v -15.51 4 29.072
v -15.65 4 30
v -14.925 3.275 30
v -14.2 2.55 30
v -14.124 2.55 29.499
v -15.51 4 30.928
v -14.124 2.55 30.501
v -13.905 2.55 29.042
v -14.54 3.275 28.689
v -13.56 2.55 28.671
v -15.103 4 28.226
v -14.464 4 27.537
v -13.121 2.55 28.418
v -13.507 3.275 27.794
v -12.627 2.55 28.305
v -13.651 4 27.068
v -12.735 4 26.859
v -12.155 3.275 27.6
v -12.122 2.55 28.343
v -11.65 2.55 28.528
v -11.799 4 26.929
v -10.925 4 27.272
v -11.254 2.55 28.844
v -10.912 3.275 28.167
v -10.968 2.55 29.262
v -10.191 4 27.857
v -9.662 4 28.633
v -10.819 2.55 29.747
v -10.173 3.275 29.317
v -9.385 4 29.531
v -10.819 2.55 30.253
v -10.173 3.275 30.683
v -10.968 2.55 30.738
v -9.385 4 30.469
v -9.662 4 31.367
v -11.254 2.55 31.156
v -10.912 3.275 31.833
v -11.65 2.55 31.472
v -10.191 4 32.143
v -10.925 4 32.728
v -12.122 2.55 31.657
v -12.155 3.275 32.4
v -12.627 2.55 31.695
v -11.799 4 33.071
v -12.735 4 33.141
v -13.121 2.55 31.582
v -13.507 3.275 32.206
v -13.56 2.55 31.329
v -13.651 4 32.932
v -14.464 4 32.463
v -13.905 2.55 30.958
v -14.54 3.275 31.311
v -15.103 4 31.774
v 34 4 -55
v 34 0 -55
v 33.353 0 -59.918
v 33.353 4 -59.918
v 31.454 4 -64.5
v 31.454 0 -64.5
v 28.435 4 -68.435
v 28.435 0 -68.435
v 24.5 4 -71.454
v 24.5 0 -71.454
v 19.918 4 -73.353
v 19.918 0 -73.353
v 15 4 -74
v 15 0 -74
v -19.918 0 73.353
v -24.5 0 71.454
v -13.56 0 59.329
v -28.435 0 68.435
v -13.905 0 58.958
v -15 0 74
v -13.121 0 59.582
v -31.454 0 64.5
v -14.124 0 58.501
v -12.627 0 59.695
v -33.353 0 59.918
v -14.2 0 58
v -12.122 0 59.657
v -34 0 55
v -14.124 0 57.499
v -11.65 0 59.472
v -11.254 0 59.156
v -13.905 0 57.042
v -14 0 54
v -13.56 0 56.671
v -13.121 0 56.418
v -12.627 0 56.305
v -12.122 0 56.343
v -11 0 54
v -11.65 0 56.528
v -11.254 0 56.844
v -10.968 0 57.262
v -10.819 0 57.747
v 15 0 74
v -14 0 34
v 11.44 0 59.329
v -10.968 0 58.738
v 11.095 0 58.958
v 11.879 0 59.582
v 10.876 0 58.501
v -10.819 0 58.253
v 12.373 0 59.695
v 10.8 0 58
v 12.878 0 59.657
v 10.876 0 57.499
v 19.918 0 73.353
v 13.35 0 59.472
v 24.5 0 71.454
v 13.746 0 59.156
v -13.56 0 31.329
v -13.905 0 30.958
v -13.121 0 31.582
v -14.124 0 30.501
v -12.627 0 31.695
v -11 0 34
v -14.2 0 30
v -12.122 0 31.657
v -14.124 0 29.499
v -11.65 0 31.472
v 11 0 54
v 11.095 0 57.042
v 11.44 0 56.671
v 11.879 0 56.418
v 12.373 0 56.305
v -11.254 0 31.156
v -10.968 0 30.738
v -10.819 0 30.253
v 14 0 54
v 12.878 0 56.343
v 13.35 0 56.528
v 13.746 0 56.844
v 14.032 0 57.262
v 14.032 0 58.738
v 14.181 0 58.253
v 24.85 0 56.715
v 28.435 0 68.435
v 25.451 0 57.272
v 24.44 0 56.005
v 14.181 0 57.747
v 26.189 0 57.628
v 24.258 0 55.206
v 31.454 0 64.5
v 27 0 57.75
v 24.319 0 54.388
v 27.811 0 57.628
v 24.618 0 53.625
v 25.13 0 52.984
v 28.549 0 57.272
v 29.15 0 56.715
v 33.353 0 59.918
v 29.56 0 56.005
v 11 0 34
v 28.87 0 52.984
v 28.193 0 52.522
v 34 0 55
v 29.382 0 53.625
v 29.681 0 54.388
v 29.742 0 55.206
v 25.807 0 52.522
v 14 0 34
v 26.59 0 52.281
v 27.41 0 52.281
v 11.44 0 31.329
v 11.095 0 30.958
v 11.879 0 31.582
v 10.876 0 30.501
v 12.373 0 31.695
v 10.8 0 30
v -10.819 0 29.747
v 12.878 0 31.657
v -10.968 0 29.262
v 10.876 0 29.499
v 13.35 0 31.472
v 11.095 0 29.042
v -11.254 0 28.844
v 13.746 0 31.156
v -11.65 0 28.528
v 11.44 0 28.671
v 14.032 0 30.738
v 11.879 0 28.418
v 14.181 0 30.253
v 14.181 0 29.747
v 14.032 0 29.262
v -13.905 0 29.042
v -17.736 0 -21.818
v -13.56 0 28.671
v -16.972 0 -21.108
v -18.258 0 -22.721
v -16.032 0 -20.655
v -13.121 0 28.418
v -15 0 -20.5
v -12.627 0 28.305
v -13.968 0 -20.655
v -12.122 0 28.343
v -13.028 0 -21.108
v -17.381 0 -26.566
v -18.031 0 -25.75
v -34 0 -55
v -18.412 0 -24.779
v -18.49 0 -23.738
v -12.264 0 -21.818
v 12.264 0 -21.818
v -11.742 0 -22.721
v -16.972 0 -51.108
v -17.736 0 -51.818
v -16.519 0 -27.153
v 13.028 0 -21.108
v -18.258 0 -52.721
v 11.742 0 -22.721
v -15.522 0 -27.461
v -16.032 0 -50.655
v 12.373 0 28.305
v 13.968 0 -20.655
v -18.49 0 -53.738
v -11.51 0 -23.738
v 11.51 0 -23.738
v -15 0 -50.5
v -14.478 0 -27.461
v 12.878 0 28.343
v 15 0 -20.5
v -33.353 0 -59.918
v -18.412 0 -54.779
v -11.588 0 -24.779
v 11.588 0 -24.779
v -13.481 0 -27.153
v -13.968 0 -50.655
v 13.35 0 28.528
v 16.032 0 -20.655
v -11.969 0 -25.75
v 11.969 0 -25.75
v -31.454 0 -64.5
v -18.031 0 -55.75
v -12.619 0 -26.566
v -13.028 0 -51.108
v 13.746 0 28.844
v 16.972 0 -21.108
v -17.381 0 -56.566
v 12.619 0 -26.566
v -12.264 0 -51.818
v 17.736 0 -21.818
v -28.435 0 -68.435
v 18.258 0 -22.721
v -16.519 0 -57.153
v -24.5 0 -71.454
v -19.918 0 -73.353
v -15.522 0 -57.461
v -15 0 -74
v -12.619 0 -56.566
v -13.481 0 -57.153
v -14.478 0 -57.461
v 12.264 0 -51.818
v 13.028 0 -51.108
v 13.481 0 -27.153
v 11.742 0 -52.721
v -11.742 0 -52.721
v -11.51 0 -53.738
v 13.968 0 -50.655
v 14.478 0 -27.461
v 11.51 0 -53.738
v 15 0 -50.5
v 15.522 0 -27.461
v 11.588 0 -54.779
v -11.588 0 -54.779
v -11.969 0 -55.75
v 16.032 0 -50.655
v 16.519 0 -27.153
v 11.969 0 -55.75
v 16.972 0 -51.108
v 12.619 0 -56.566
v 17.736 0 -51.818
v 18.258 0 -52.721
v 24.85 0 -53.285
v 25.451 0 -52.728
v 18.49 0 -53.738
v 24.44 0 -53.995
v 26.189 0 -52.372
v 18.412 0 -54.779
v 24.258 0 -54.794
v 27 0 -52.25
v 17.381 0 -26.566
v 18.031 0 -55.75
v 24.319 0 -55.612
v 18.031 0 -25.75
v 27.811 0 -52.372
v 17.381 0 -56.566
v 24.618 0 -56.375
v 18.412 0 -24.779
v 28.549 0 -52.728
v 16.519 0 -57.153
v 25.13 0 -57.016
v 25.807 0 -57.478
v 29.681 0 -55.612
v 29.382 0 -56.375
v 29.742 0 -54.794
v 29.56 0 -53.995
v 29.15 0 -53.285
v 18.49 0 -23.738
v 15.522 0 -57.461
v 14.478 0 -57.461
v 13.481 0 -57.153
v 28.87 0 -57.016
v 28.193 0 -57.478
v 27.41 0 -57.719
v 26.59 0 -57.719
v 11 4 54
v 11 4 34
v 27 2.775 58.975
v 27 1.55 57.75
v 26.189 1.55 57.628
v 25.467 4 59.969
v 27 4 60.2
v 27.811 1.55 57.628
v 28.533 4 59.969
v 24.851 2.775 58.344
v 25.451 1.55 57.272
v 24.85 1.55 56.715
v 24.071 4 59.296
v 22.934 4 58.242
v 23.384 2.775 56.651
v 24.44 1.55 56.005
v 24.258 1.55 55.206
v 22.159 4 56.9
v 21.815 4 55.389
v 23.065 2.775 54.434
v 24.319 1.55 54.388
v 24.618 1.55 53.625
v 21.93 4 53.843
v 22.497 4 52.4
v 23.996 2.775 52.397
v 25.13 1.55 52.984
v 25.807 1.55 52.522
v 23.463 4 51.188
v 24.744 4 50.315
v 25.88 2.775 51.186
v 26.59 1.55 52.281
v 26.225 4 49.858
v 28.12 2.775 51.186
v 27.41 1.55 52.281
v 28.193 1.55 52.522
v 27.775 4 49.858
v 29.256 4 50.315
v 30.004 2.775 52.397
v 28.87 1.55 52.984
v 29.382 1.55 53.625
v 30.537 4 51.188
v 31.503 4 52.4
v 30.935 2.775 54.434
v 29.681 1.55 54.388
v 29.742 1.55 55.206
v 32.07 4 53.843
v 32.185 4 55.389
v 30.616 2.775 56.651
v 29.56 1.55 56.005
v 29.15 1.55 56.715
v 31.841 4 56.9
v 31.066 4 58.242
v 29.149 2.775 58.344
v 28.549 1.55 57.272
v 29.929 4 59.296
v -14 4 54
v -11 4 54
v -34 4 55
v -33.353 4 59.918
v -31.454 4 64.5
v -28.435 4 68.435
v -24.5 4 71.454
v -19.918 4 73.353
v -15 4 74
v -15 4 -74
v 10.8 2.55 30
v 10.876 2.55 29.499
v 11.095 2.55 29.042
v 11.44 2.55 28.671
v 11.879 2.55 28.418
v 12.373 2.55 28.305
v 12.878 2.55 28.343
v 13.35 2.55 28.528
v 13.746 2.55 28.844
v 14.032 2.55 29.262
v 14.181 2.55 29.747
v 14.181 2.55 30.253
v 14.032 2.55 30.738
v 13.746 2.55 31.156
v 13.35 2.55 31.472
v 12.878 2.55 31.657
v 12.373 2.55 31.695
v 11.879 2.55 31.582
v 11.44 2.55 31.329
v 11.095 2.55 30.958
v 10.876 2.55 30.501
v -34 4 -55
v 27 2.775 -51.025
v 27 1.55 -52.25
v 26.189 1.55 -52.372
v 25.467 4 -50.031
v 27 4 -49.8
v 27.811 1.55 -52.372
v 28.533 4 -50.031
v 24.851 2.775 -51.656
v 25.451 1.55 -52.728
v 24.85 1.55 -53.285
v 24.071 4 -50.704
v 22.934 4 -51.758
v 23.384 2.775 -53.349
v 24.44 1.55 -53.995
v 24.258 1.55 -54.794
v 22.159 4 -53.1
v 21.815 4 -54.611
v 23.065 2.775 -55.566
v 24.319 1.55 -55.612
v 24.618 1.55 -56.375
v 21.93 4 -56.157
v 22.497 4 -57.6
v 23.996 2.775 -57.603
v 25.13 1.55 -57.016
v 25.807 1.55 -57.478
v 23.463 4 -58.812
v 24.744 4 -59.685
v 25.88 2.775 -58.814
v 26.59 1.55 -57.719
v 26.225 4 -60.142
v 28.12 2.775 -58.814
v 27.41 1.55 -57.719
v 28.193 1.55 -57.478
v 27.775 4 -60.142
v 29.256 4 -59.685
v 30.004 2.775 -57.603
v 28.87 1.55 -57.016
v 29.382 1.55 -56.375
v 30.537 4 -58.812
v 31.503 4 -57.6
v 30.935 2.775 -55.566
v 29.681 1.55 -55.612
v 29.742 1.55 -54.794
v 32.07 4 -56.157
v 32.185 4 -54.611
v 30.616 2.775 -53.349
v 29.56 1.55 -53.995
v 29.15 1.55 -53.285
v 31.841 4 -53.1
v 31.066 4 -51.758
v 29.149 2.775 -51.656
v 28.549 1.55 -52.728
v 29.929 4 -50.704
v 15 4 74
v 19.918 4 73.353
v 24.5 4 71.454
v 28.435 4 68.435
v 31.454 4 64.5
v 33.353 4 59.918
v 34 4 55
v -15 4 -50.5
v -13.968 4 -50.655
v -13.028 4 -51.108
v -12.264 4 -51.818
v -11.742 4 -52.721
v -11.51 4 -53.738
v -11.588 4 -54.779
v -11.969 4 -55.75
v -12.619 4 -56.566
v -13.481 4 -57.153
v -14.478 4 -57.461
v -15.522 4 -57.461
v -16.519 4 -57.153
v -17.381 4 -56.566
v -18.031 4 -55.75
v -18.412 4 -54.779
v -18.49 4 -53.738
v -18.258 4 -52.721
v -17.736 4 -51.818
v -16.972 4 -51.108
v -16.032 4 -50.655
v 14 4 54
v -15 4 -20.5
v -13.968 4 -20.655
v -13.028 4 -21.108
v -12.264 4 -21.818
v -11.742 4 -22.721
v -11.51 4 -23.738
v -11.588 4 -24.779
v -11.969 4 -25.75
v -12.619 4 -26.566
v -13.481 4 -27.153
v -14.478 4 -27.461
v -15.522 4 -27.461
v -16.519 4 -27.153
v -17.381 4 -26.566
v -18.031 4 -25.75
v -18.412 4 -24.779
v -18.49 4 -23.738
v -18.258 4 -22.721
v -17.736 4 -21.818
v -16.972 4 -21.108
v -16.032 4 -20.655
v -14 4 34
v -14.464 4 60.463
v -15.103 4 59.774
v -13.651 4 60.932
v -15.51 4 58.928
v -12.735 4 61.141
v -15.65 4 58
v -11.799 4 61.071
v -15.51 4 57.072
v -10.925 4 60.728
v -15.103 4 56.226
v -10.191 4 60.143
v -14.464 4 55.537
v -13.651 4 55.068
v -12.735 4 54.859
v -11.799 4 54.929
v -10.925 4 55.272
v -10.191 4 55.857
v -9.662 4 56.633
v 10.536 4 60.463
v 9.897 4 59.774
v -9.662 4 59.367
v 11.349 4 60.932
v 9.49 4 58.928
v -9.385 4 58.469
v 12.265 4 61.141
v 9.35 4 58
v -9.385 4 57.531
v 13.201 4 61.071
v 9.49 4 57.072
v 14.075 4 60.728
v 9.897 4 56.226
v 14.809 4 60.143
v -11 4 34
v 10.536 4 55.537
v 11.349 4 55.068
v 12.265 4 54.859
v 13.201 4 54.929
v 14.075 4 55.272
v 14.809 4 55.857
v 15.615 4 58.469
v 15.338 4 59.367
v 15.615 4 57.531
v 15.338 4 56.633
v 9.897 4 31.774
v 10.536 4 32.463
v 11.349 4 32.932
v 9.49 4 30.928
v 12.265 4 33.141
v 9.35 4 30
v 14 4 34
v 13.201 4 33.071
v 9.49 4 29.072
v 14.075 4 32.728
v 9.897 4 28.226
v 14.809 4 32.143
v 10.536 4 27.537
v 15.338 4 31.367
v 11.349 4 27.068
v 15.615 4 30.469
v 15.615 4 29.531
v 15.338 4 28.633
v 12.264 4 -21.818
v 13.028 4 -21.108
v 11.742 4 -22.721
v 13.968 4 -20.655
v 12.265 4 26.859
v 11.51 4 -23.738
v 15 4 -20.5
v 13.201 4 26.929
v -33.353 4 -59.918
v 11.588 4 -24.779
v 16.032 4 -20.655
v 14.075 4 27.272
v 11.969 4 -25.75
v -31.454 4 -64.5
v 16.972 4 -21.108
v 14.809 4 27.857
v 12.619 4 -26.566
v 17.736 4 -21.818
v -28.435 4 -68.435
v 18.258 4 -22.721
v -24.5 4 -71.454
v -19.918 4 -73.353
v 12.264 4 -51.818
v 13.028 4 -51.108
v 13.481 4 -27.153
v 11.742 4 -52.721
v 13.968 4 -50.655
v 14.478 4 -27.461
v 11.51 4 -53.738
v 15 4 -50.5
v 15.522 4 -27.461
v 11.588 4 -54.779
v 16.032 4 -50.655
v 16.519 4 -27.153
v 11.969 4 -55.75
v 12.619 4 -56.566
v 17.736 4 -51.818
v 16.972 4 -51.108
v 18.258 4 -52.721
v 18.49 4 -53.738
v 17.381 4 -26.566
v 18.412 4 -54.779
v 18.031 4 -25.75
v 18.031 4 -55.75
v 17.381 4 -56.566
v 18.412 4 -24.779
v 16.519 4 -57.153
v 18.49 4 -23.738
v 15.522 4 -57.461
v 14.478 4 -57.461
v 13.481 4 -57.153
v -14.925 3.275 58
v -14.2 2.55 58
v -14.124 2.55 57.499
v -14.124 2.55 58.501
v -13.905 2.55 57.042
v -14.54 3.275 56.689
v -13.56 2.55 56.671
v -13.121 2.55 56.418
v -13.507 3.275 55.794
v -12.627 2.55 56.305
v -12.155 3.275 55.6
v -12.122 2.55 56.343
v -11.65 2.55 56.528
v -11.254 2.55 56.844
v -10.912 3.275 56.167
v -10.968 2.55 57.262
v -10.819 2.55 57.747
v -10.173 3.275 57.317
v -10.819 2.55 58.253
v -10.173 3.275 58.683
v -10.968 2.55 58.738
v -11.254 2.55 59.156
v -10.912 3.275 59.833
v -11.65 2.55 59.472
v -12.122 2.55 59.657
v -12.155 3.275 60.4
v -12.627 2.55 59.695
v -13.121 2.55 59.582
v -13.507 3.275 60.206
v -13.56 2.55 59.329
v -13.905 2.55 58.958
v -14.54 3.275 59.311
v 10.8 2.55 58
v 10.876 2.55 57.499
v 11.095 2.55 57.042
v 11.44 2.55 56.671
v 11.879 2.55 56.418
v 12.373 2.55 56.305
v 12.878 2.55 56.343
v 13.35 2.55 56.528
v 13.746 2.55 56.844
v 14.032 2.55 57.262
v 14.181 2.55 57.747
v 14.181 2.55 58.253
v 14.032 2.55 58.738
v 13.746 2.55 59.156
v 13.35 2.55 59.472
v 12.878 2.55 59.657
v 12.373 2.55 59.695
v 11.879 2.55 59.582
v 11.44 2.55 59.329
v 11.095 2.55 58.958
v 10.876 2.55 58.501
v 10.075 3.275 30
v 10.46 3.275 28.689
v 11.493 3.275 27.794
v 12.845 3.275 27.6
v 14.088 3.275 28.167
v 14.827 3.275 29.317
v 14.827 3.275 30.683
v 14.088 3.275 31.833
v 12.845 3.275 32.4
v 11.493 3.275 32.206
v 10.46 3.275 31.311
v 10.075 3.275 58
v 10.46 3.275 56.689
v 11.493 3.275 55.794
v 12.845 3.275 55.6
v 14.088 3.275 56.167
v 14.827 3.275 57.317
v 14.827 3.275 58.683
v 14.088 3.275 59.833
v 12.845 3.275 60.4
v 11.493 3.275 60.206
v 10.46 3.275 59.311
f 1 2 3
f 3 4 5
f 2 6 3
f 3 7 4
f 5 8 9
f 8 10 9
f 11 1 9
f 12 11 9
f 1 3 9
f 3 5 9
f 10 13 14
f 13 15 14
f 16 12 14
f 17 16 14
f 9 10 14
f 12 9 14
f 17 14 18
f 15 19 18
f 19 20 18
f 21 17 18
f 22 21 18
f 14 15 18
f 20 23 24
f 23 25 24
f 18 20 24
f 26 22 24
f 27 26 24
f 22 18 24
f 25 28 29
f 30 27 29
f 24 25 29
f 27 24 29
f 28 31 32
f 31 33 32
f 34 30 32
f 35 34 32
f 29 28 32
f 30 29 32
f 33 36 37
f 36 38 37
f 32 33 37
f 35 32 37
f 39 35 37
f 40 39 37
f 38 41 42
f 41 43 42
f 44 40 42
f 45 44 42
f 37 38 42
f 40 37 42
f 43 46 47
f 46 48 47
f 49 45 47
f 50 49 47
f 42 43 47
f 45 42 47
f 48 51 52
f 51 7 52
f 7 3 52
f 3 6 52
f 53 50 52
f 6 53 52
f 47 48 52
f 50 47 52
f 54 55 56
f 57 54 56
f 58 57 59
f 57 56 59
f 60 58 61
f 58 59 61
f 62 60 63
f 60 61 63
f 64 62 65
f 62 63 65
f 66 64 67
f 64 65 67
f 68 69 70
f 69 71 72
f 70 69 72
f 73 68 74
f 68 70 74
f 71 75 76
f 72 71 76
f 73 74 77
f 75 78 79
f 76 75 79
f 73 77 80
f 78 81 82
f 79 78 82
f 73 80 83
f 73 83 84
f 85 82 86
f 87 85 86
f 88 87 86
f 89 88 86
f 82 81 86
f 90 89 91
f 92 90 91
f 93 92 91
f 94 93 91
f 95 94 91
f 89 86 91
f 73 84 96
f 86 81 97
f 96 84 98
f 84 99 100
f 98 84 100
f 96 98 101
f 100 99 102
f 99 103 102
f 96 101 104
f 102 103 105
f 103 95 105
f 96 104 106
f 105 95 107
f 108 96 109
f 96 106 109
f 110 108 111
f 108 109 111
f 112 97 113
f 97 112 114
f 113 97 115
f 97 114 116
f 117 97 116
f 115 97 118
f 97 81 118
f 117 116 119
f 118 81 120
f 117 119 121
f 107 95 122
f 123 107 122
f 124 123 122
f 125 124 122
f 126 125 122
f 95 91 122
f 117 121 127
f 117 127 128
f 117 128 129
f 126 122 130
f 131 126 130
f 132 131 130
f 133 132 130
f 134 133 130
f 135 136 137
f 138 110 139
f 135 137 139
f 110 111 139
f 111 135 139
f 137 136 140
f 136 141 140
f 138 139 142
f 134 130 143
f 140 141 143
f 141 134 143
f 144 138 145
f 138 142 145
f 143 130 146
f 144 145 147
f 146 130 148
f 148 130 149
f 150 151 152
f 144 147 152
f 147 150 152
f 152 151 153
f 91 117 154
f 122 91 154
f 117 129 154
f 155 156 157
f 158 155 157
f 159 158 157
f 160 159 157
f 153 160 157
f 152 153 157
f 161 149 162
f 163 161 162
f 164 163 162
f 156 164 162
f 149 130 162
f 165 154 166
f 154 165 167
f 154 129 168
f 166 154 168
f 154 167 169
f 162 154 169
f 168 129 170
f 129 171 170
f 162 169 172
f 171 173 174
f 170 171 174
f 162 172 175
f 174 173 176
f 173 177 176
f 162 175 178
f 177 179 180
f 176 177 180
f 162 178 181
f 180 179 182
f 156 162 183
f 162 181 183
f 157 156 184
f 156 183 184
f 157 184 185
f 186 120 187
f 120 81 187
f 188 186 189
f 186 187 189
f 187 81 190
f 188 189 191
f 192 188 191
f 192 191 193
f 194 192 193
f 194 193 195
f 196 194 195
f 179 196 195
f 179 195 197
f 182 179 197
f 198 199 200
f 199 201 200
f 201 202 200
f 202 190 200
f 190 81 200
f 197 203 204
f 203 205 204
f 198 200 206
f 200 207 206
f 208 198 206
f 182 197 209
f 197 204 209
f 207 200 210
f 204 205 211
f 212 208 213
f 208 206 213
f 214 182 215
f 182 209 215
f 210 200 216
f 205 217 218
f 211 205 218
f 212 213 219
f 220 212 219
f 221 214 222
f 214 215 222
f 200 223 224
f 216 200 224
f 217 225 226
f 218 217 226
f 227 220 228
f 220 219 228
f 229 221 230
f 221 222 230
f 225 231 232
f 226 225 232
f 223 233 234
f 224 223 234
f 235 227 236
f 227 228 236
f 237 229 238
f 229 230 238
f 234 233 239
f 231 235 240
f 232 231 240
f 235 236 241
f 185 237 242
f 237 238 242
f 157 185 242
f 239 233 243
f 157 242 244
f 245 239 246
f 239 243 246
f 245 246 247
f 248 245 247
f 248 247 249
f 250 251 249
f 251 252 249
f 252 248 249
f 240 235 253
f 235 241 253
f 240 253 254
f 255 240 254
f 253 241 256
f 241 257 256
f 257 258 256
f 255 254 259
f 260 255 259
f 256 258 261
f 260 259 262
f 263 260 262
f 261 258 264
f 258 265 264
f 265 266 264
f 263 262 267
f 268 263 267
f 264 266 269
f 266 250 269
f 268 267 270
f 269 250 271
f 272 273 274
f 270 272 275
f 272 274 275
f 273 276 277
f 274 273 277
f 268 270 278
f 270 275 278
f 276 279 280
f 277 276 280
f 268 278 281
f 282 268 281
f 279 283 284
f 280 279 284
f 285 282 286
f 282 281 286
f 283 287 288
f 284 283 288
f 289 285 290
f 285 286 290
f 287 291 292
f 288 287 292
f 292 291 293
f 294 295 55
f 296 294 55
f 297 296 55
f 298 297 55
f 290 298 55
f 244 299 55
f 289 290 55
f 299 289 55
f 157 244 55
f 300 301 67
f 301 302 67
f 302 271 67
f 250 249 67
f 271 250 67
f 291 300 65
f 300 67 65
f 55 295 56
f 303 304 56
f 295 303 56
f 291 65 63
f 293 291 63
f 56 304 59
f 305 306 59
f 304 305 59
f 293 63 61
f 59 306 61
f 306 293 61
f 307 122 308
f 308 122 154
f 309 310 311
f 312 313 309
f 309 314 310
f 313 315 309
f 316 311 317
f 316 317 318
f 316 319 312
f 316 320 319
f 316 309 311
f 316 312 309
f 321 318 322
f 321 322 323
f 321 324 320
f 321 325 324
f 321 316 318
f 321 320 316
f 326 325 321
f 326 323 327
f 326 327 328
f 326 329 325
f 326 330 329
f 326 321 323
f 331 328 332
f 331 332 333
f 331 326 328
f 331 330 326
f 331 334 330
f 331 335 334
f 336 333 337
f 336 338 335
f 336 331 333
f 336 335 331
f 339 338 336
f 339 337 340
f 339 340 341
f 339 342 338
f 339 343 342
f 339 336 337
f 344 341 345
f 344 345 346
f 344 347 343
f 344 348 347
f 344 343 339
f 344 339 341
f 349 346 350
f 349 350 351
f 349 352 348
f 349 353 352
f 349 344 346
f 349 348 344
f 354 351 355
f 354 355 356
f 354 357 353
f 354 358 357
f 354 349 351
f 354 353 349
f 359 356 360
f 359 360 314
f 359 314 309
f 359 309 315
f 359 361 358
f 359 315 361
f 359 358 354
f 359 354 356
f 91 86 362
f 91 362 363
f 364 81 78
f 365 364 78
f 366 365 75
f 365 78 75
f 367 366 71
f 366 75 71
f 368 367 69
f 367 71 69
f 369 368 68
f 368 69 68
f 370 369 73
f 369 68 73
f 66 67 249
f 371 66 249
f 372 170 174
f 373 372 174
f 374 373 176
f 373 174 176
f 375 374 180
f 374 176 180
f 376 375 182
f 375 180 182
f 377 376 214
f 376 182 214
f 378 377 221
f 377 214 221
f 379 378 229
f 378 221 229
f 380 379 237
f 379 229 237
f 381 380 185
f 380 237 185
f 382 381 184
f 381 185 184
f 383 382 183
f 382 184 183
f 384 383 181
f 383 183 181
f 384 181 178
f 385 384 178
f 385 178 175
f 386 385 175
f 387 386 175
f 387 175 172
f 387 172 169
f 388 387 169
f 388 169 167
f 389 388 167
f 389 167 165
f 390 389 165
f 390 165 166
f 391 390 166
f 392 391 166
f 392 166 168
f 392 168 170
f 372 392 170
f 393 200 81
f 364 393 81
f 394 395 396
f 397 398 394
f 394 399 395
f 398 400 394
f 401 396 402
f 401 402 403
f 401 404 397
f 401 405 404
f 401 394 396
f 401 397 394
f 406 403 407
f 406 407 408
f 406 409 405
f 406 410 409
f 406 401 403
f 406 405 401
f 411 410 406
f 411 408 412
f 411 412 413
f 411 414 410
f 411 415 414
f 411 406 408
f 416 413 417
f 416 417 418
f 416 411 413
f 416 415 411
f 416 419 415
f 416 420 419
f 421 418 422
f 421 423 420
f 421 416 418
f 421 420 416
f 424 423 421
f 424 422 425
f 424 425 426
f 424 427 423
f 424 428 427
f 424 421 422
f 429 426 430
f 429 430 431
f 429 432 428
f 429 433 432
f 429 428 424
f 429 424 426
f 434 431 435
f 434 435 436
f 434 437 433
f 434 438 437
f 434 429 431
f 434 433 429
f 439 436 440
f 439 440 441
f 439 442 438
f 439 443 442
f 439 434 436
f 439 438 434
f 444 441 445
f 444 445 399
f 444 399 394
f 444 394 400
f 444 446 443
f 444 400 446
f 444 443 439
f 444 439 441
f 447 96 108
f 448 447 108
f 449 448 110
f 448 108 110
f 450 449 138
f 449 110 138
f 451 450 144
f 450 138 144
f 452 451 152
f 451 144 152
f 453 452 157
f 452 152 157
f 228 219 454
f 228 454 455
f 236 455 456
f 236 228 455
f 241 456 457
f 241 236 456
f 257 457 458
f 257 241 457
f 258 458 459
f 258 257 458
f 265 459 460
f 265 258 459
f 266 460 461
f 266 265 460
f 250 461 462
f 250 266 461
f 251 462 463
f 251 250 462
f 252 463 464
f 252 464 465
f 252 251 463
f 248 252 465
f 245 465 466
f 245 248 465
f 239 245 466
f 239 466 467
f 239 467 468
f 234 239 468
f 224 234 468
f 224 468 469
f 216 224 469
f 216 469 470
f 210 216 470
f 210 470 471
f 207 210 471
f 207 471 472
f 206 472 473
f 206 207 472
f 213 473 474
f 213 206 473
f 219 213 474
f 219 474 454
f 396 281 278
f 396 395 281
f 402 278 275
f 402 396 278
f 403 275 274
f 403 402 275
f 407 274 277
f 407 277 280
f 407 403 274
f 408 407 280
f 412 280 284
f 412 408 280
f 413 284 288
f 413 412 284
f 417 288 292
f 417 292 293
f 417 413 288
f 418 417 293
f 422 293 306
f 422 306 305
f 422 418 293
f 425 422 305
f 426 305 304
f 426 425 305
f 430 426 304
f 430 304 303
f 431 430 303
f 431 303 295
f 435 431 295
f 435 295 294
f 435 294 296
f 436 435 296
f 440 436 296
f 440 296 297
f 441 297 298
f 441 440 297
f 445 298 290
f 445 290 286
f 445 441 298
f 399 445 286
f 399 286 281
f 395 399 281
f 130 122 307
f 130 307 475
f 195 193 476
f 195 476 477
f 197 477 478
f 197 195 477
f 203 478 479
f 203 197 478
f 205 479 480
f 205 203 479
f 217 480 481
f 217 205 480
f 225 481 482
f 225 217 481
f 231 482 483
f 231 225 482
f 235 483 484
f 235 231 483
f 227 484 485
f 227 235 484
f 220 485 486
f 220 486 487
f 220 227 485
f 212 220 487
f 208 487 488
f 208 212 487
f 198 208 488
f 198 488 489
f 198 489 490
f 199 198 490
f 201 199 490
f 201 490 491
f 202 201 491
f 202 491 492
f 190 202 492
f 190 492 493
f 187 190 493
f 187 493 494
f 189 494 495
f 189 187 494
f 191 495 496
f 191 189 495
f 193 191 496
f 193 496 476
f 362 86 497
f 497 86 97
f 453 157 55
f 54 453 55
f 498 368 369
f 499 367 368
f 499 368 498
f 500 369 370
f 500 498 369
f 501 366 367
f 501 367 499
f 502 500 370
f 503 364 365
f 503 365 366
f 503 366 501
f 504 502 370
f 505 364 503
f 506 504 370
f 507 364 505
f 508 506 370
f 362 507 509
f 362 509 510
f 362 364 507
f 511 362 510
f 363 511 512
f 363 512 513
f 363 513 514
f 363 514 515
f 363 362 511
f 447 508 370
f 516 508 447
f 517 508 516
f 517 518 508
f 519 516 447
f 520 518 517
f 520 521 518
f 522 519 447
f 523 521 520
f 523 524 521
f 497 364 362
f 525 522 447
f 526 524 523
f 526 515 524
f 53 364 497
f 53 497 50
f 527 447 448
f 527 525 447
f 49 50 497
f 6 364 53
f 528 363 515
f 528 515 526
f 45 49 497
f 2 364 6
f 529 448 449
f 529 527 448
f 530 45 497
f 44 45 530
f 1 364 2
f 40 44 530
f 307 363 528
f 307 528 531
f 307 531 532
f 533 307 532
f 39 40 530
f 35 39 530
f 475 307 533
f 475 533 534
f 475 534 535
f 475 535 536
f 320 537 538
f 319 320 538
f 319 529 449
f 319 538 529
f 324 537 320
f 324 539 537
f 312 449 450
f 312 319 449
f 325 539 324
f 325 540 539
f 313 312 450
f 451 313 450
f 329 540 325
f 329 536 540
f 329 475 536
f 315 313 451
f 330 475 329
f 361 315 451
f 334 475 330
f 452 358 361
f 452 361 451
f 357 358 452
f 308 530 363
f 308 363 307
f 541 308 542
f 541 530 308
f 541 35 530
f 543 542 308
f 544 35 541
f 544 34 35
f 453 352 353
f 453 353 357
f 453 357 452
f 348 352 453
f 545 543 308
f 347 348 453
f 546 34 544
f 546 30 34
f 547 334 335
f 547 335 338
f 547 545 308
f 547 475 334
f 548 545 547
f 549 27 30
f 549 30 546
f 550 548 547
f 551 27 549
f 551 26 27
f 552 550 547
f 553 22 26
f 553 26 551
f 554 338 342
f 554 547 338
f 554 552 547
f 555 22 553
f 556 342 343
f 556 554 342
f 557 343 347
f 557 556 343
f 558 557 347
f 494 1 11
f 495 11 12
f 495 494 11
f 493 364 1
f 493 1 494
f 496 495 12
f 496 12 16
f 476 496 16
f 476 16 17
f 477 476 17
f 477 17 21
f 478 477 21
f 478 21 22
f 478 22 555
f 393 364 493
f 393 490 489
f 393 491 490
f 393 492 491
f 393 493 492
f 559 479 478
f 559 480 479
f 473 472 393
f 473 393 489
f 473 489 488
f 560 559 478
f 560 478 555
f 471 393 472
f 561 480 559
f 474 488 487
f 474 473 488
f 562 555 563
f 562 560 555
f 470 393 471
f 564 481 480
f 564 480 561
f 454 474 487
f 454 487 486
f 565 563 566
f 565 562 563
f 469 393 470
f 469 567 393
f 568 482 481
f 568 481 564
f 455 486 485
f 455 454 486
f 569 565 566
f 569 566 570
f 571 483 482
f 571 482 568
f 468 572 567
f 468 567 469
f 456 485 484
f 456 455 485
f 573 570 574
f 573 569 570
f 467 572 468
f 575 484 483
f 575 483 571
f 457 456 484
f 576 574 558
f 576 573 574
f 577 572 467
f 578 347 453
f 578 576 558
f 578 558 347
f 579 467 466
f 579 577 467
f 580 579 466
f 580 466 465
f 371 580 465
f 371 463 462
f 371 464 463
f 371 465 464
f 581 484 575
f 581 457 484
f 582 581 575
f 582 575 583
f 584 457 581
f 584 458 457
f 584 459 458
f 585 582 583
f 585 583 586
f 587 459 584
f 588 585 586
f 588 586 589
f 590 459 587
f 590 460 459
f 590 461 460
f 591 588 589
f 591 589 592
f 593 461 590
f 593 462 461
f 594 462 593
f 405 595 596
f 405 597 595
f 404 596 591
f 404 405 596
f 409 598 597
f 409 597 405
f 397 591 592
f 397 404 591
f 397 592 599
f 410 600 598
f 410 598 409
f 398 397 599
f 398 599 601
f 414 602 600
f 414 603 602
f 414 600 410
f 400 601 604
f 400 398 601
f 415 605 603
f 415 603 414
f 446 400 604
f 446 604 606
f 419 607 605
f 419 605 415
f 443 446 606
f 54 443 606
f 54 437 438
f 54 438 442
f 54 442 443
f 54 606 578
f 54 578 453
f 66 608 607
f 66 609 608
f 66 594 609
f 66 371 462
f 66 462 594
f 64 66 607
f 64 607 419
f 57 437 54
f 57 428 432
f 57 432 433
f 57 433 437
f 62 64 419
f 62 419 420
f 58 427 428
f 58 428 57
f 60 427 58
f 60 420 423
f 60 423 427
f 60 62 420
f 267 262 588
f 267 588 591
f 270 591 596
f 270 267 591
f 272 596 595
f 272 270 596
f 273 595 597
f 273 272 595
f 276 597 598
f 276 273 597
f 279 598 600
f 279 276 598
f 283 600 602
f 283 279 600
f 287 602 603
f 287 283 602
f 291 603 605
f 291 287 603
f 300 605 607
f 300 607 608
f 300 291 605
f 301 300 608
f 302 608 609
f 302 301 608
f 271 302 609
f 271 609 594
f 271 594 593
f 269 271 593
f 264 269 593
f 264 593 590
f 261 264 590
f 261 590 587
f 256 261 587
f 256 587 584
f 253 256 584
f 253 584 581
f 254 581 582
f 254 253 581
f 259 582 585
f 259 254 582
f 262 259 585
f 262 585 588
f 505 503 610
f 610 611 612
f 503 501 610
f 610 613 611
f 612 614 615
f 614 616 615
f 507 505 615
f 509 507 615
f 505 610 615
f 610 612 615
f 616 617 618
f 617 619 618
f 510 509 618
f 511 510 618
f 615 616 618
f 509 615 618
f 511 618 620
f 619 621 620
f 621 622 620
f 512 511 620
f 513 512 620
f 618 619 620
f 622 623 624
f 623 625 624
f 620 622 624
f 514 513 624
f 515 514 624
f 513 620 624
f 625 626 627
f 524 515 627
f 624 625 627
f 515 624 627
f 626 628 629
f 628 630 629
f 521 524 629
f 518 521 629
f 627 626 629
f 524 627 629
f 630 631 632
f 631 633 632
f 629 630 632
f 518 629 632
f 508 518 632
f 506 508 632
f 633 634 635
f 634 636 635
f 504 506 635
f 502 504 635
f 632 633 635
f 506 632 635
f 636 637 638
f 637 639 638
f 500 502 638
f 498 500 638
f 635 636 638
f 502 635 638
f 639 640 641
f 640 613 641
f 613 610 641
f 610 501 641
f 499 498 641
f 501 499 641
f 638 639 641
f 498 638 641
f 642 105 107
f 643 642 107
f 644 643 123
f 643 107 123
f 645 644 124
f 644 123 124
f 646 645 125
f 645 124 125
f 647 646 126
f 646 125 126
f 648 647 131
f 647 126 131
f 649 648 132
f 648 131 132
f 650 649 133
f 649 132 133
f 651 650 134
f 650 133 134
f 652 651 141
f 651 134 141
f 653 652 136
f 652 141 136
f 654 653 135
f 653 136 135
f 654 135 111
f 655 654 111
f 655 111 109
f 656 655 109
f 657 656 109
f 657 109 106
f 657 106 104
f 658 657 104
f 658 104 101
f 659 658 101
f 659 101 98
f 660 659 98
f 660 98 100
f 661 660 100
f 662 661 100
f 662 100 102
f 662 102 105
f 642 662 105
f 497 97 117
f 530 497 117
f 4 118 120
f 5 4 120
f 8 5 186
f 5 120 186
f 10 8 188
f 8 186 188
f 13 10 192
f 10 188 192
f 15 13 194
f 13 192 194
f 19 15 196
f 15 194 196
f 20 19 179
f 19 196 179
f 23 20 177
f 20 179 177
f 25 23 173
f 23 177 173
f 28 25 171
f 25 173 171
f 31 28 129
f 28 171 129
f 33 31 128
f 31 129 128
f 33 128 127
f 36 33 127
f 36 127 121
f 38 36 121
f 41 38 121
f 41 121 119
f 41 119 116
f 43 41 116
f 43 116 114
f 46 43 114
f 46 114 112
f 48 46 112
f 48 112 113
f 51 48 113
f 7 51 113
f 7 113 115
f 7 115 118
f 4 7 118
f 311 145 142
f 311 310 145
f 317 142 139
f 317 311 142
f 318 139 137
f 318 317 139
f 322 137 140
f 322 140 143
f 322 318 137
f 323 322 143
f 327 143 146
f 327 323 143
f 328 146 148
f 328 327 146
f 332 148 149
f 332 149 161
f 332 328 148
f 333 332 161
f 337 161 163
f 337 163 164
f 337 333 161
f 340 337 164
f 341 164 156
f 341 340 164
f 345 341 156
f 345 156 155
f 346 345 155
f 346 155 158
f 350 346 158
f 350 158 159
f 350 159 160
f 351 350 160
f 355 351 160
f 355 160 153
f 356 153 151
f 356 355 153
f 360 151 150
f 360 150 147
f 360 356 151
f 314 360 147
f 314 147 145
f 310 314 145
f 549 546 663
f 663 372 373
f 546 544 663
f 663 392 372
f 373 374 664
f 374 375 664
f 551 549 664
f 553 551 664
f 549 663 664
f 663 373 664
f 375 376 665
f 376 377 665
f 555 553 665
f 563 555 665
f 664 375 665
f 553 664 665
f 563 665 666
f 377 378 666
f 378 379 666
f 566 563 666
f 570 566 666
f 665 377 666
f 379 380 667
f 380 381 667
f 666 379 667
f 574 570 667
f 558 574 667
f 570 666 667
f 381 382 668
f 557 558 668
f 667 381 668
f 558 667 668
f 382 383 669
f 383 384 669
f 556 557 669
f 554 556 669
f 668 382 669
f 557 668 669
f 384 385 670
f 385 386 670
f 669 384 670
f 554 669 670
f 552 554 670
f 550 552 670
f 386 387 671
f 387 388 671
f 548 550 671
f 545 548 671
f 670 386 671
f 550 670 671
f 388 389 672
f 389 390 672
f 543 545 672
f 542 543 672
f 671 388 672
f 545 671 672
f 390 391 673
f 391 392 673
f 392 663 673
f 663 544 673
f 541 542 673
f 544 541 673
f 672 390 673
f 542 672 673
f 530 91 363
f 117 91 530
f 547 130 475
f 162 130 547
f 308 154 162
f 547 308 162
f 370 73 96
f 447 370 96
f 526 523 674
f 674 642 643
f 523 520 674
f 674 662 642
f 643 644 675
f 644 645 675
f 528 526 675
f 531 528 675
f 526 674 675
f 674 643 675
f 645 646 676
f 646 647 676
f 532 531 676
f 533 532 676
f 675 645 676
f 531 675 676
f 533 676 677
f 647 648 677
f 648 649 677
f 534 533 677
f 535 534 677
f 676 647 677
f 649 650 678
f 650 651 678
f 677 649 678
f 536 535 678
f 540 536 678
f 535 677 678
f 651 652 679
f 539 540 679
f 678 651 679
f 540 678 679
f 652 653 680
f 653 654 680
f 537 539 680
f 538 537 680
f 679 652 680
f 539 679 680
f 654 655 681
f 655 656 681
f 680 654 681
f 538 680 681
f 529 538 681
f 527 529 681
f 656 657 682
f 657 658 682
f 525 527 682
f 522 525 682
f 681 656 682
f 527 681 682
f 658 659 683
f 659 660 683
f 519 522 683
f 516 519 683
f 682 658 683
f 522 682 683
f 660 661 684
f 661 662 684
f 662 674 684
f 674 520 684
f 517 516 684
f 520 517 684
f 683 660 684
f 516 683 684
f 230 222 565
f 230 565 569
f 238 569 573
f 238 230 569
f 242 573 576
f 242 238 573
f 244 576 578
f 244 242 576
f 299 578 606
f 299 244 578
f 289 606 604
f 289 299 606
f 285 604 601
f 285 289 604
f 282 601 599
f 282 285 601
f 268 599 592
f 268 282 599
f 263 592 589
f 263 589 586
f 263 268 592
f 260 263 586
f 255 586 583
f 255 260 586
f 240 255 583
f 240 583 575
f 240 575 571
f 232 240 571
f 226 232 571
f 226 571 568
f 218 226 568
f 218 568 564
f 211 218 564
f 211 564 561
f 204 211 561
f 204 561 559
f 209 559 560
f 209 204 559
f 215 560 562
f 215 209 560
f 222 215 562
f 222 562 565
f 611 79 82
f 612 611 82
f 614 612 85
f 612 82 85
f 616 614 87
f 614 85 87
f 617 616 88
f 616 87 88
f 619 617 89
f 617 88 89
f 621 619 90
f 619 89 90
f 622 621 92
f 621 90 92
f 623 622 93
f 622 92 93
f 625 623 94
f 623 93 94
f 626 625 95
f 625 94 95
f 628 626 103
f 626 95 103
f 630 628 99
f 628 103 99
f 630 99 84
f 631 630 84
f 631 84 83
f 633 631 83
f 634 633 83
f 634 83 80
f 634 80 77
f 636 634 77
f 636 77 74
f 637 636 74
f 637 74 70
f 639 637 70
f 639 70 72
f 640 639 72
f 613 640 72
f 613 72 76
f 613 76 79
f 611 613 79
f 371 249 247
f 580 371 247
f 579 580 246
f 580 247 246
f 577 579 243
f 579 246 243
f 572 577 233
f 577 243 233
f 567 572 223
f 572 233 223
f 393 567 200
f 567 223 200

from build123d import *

# Parameters (mm, degrees)
SKETCH1_R                                     = 3.5
SKETCH1_R_2                                   = 1.5
SKETCH1_W                                     = 3
SKETCH1_H                                     = 20
BOSS_EXTRUDE1_DEPTH                           = 4
CSK_FOR_M5_COUNTERSUNK_FLAT_HEAD1_AT_2_COUNT  = 2
CSK_FOR_M5_COUNTERSUNK_FLAT_HEAD1_AT_2_PITCH  = 110
CSK_FOR_M3_COUNTERSUNK_FLAT_HEAD1_D           = 3.4
CSK_FOR_M3_COUNTERSUNK_FLAT_HEAD1_DEPTH       = 4
CSK_FOR_M3_COUNTERSUNK_FLAT_HEAD1_CSINK_D     = 6.3
CSK_FOR_M3_COUNTERSUNK_FLAT_HEAD1_CSINK_ANGLE = 90


with BuildPart() as part:
    # Sketch1 → Boss-Extrude1 (new body)
    with BuildSketch(Plane(origin=(0, 0, 0), x_dir=(1, 0, 0), z_dir=(0, 1, 0))):
        with BuildLine():
            Line((-15, -74), (15, -74))
            ThreePointArc((15, -74), (28.435028843, -68.435028843), (34, -55))
            Line((34, -55), (34, 55))
            ThreePointArc((34, 55), (28.435028843, 68.435028843), (15, 74))
            Line((15, 74), (-15, 74))
            ThreePointArc((-15, 74), (-28.435028843, 68.435028843), (-34, 55))
            Line((-34, 55), (-34, -55))
            ThreePointArc((-34, -55), (-28.435028843, -68.435028843), (-15, -74))
        make_face()
        with Locations(Location((-15, 54, 0), (0, 0, 270))):
            Circle(SKETCH1_R, mode=Mode.SUBTRACT)
        with Locations(Location((-15, 24, 0), (0, 0, 270))):
            Circle(SKETCH1_R, mode=Mode.SUBTRACT)
        with Locations(Location((15, 24, 0), (0, 0, 270))):
            Circle(SKETCH1_R, mode=Mode.SUBTRACT)
        with Locations(Location((15, 54, 0), (0, 0, 270))):
            Circle(SKETCH1_R, mode=Mode.SUBTRACT)
        with Locations(Location((-12.5, -30, 0), (0, 0, 270))):
            Circle(SKETCH1_R_2, mode=Mode.SUBTRACT)
        with Locations(Location((-12.5, -58, 0), (0, 0, 270))):
            Circle(SKETCH1_R_2, mode=Mode.SUBTRACT)
        with Locations(Location((12.5, -30, 0), (0, 0, 90))):
            Circle(SKETCH1_R_2, mode=Mode.SUBTRACT)
        with Locations(Location((12.5, -58, 0), (0, 0, 90))):
            Circle(SKETCH1_R_2, mode=Mode.SUBTRACT)
        with Locations((-12.5, -44)):
            Rectangle(SKETCH1_W, SKETCH1_H, mode=Mode.SUBTRACT)
        with Locations((12.5, -44)):
            Rectangle(SKETCH1_W, SKETCH1_H, mode=Mode.SUBTRACT)
    extrude(amount=BOSS_EXTRUDE1_DEPTH)

    # Sketch3 → CSK for M5 Countersunk Flat Head1 (revolve, cut)
    with BuildSketch(Plane(origin=(27, 4, -55), x_dir=(0, 0, 1), z_dir=(1, 0, 0))):
        Polygon((0, 0), (0, 4), (2.75, 4), (2.75, 2.45), (5.2, 0), align=None)
    csk_for_m5_countersunk_flat_head1 = revolve(axis=Axis((27, 10.35, -55), (0, -1, 0)), mode=Mode.SUBTRACT)

    # CSK for M5 Countersunk Flat Head1 at 2: CSK for M5 Countersunk Flat Head1 ×2
    with Locations(*[(0, 0, i * CSK_FOR_M5_COUNTERSUNK_FLAT_HEAD1_AT_2_PITCH) for i in range(1, CSK_FOR_M5_COUNTERSUNK_FLAT_HEAD1_AT_2_COUNT)]):
        add(csk_for_m5_countersunk_flat_head1, mode=Mode.SUBTRACT)

    # CSK for M3 Countersunk Flat Head1
    with Locations(Plane(origin=(0, 4, 0), x_dir=(1, 0, 0), z_dir=(0, 1, 0))):
        with Locations((-12.5, -30), (12.5, -30), (12.5, -58), (-12.5, -58)):
            CounterSinkHole(CSK_FOR_M3_COUNTERSUNK_FLAT_HEAD1_D / 2, CSK_FOR_M3_COUNTERSUNK_FLAT_HEAD1_CSINK_D / 2, depth=CSK_FOR_M3_COUNTERSUNK_FLAT_HEAD1_DEPTH, counter_sink_angle=CSK_FOR_M3_COUNTERSUNK_FLAT_HEAD1_CSINK_ANGLE)


solid = part.part
